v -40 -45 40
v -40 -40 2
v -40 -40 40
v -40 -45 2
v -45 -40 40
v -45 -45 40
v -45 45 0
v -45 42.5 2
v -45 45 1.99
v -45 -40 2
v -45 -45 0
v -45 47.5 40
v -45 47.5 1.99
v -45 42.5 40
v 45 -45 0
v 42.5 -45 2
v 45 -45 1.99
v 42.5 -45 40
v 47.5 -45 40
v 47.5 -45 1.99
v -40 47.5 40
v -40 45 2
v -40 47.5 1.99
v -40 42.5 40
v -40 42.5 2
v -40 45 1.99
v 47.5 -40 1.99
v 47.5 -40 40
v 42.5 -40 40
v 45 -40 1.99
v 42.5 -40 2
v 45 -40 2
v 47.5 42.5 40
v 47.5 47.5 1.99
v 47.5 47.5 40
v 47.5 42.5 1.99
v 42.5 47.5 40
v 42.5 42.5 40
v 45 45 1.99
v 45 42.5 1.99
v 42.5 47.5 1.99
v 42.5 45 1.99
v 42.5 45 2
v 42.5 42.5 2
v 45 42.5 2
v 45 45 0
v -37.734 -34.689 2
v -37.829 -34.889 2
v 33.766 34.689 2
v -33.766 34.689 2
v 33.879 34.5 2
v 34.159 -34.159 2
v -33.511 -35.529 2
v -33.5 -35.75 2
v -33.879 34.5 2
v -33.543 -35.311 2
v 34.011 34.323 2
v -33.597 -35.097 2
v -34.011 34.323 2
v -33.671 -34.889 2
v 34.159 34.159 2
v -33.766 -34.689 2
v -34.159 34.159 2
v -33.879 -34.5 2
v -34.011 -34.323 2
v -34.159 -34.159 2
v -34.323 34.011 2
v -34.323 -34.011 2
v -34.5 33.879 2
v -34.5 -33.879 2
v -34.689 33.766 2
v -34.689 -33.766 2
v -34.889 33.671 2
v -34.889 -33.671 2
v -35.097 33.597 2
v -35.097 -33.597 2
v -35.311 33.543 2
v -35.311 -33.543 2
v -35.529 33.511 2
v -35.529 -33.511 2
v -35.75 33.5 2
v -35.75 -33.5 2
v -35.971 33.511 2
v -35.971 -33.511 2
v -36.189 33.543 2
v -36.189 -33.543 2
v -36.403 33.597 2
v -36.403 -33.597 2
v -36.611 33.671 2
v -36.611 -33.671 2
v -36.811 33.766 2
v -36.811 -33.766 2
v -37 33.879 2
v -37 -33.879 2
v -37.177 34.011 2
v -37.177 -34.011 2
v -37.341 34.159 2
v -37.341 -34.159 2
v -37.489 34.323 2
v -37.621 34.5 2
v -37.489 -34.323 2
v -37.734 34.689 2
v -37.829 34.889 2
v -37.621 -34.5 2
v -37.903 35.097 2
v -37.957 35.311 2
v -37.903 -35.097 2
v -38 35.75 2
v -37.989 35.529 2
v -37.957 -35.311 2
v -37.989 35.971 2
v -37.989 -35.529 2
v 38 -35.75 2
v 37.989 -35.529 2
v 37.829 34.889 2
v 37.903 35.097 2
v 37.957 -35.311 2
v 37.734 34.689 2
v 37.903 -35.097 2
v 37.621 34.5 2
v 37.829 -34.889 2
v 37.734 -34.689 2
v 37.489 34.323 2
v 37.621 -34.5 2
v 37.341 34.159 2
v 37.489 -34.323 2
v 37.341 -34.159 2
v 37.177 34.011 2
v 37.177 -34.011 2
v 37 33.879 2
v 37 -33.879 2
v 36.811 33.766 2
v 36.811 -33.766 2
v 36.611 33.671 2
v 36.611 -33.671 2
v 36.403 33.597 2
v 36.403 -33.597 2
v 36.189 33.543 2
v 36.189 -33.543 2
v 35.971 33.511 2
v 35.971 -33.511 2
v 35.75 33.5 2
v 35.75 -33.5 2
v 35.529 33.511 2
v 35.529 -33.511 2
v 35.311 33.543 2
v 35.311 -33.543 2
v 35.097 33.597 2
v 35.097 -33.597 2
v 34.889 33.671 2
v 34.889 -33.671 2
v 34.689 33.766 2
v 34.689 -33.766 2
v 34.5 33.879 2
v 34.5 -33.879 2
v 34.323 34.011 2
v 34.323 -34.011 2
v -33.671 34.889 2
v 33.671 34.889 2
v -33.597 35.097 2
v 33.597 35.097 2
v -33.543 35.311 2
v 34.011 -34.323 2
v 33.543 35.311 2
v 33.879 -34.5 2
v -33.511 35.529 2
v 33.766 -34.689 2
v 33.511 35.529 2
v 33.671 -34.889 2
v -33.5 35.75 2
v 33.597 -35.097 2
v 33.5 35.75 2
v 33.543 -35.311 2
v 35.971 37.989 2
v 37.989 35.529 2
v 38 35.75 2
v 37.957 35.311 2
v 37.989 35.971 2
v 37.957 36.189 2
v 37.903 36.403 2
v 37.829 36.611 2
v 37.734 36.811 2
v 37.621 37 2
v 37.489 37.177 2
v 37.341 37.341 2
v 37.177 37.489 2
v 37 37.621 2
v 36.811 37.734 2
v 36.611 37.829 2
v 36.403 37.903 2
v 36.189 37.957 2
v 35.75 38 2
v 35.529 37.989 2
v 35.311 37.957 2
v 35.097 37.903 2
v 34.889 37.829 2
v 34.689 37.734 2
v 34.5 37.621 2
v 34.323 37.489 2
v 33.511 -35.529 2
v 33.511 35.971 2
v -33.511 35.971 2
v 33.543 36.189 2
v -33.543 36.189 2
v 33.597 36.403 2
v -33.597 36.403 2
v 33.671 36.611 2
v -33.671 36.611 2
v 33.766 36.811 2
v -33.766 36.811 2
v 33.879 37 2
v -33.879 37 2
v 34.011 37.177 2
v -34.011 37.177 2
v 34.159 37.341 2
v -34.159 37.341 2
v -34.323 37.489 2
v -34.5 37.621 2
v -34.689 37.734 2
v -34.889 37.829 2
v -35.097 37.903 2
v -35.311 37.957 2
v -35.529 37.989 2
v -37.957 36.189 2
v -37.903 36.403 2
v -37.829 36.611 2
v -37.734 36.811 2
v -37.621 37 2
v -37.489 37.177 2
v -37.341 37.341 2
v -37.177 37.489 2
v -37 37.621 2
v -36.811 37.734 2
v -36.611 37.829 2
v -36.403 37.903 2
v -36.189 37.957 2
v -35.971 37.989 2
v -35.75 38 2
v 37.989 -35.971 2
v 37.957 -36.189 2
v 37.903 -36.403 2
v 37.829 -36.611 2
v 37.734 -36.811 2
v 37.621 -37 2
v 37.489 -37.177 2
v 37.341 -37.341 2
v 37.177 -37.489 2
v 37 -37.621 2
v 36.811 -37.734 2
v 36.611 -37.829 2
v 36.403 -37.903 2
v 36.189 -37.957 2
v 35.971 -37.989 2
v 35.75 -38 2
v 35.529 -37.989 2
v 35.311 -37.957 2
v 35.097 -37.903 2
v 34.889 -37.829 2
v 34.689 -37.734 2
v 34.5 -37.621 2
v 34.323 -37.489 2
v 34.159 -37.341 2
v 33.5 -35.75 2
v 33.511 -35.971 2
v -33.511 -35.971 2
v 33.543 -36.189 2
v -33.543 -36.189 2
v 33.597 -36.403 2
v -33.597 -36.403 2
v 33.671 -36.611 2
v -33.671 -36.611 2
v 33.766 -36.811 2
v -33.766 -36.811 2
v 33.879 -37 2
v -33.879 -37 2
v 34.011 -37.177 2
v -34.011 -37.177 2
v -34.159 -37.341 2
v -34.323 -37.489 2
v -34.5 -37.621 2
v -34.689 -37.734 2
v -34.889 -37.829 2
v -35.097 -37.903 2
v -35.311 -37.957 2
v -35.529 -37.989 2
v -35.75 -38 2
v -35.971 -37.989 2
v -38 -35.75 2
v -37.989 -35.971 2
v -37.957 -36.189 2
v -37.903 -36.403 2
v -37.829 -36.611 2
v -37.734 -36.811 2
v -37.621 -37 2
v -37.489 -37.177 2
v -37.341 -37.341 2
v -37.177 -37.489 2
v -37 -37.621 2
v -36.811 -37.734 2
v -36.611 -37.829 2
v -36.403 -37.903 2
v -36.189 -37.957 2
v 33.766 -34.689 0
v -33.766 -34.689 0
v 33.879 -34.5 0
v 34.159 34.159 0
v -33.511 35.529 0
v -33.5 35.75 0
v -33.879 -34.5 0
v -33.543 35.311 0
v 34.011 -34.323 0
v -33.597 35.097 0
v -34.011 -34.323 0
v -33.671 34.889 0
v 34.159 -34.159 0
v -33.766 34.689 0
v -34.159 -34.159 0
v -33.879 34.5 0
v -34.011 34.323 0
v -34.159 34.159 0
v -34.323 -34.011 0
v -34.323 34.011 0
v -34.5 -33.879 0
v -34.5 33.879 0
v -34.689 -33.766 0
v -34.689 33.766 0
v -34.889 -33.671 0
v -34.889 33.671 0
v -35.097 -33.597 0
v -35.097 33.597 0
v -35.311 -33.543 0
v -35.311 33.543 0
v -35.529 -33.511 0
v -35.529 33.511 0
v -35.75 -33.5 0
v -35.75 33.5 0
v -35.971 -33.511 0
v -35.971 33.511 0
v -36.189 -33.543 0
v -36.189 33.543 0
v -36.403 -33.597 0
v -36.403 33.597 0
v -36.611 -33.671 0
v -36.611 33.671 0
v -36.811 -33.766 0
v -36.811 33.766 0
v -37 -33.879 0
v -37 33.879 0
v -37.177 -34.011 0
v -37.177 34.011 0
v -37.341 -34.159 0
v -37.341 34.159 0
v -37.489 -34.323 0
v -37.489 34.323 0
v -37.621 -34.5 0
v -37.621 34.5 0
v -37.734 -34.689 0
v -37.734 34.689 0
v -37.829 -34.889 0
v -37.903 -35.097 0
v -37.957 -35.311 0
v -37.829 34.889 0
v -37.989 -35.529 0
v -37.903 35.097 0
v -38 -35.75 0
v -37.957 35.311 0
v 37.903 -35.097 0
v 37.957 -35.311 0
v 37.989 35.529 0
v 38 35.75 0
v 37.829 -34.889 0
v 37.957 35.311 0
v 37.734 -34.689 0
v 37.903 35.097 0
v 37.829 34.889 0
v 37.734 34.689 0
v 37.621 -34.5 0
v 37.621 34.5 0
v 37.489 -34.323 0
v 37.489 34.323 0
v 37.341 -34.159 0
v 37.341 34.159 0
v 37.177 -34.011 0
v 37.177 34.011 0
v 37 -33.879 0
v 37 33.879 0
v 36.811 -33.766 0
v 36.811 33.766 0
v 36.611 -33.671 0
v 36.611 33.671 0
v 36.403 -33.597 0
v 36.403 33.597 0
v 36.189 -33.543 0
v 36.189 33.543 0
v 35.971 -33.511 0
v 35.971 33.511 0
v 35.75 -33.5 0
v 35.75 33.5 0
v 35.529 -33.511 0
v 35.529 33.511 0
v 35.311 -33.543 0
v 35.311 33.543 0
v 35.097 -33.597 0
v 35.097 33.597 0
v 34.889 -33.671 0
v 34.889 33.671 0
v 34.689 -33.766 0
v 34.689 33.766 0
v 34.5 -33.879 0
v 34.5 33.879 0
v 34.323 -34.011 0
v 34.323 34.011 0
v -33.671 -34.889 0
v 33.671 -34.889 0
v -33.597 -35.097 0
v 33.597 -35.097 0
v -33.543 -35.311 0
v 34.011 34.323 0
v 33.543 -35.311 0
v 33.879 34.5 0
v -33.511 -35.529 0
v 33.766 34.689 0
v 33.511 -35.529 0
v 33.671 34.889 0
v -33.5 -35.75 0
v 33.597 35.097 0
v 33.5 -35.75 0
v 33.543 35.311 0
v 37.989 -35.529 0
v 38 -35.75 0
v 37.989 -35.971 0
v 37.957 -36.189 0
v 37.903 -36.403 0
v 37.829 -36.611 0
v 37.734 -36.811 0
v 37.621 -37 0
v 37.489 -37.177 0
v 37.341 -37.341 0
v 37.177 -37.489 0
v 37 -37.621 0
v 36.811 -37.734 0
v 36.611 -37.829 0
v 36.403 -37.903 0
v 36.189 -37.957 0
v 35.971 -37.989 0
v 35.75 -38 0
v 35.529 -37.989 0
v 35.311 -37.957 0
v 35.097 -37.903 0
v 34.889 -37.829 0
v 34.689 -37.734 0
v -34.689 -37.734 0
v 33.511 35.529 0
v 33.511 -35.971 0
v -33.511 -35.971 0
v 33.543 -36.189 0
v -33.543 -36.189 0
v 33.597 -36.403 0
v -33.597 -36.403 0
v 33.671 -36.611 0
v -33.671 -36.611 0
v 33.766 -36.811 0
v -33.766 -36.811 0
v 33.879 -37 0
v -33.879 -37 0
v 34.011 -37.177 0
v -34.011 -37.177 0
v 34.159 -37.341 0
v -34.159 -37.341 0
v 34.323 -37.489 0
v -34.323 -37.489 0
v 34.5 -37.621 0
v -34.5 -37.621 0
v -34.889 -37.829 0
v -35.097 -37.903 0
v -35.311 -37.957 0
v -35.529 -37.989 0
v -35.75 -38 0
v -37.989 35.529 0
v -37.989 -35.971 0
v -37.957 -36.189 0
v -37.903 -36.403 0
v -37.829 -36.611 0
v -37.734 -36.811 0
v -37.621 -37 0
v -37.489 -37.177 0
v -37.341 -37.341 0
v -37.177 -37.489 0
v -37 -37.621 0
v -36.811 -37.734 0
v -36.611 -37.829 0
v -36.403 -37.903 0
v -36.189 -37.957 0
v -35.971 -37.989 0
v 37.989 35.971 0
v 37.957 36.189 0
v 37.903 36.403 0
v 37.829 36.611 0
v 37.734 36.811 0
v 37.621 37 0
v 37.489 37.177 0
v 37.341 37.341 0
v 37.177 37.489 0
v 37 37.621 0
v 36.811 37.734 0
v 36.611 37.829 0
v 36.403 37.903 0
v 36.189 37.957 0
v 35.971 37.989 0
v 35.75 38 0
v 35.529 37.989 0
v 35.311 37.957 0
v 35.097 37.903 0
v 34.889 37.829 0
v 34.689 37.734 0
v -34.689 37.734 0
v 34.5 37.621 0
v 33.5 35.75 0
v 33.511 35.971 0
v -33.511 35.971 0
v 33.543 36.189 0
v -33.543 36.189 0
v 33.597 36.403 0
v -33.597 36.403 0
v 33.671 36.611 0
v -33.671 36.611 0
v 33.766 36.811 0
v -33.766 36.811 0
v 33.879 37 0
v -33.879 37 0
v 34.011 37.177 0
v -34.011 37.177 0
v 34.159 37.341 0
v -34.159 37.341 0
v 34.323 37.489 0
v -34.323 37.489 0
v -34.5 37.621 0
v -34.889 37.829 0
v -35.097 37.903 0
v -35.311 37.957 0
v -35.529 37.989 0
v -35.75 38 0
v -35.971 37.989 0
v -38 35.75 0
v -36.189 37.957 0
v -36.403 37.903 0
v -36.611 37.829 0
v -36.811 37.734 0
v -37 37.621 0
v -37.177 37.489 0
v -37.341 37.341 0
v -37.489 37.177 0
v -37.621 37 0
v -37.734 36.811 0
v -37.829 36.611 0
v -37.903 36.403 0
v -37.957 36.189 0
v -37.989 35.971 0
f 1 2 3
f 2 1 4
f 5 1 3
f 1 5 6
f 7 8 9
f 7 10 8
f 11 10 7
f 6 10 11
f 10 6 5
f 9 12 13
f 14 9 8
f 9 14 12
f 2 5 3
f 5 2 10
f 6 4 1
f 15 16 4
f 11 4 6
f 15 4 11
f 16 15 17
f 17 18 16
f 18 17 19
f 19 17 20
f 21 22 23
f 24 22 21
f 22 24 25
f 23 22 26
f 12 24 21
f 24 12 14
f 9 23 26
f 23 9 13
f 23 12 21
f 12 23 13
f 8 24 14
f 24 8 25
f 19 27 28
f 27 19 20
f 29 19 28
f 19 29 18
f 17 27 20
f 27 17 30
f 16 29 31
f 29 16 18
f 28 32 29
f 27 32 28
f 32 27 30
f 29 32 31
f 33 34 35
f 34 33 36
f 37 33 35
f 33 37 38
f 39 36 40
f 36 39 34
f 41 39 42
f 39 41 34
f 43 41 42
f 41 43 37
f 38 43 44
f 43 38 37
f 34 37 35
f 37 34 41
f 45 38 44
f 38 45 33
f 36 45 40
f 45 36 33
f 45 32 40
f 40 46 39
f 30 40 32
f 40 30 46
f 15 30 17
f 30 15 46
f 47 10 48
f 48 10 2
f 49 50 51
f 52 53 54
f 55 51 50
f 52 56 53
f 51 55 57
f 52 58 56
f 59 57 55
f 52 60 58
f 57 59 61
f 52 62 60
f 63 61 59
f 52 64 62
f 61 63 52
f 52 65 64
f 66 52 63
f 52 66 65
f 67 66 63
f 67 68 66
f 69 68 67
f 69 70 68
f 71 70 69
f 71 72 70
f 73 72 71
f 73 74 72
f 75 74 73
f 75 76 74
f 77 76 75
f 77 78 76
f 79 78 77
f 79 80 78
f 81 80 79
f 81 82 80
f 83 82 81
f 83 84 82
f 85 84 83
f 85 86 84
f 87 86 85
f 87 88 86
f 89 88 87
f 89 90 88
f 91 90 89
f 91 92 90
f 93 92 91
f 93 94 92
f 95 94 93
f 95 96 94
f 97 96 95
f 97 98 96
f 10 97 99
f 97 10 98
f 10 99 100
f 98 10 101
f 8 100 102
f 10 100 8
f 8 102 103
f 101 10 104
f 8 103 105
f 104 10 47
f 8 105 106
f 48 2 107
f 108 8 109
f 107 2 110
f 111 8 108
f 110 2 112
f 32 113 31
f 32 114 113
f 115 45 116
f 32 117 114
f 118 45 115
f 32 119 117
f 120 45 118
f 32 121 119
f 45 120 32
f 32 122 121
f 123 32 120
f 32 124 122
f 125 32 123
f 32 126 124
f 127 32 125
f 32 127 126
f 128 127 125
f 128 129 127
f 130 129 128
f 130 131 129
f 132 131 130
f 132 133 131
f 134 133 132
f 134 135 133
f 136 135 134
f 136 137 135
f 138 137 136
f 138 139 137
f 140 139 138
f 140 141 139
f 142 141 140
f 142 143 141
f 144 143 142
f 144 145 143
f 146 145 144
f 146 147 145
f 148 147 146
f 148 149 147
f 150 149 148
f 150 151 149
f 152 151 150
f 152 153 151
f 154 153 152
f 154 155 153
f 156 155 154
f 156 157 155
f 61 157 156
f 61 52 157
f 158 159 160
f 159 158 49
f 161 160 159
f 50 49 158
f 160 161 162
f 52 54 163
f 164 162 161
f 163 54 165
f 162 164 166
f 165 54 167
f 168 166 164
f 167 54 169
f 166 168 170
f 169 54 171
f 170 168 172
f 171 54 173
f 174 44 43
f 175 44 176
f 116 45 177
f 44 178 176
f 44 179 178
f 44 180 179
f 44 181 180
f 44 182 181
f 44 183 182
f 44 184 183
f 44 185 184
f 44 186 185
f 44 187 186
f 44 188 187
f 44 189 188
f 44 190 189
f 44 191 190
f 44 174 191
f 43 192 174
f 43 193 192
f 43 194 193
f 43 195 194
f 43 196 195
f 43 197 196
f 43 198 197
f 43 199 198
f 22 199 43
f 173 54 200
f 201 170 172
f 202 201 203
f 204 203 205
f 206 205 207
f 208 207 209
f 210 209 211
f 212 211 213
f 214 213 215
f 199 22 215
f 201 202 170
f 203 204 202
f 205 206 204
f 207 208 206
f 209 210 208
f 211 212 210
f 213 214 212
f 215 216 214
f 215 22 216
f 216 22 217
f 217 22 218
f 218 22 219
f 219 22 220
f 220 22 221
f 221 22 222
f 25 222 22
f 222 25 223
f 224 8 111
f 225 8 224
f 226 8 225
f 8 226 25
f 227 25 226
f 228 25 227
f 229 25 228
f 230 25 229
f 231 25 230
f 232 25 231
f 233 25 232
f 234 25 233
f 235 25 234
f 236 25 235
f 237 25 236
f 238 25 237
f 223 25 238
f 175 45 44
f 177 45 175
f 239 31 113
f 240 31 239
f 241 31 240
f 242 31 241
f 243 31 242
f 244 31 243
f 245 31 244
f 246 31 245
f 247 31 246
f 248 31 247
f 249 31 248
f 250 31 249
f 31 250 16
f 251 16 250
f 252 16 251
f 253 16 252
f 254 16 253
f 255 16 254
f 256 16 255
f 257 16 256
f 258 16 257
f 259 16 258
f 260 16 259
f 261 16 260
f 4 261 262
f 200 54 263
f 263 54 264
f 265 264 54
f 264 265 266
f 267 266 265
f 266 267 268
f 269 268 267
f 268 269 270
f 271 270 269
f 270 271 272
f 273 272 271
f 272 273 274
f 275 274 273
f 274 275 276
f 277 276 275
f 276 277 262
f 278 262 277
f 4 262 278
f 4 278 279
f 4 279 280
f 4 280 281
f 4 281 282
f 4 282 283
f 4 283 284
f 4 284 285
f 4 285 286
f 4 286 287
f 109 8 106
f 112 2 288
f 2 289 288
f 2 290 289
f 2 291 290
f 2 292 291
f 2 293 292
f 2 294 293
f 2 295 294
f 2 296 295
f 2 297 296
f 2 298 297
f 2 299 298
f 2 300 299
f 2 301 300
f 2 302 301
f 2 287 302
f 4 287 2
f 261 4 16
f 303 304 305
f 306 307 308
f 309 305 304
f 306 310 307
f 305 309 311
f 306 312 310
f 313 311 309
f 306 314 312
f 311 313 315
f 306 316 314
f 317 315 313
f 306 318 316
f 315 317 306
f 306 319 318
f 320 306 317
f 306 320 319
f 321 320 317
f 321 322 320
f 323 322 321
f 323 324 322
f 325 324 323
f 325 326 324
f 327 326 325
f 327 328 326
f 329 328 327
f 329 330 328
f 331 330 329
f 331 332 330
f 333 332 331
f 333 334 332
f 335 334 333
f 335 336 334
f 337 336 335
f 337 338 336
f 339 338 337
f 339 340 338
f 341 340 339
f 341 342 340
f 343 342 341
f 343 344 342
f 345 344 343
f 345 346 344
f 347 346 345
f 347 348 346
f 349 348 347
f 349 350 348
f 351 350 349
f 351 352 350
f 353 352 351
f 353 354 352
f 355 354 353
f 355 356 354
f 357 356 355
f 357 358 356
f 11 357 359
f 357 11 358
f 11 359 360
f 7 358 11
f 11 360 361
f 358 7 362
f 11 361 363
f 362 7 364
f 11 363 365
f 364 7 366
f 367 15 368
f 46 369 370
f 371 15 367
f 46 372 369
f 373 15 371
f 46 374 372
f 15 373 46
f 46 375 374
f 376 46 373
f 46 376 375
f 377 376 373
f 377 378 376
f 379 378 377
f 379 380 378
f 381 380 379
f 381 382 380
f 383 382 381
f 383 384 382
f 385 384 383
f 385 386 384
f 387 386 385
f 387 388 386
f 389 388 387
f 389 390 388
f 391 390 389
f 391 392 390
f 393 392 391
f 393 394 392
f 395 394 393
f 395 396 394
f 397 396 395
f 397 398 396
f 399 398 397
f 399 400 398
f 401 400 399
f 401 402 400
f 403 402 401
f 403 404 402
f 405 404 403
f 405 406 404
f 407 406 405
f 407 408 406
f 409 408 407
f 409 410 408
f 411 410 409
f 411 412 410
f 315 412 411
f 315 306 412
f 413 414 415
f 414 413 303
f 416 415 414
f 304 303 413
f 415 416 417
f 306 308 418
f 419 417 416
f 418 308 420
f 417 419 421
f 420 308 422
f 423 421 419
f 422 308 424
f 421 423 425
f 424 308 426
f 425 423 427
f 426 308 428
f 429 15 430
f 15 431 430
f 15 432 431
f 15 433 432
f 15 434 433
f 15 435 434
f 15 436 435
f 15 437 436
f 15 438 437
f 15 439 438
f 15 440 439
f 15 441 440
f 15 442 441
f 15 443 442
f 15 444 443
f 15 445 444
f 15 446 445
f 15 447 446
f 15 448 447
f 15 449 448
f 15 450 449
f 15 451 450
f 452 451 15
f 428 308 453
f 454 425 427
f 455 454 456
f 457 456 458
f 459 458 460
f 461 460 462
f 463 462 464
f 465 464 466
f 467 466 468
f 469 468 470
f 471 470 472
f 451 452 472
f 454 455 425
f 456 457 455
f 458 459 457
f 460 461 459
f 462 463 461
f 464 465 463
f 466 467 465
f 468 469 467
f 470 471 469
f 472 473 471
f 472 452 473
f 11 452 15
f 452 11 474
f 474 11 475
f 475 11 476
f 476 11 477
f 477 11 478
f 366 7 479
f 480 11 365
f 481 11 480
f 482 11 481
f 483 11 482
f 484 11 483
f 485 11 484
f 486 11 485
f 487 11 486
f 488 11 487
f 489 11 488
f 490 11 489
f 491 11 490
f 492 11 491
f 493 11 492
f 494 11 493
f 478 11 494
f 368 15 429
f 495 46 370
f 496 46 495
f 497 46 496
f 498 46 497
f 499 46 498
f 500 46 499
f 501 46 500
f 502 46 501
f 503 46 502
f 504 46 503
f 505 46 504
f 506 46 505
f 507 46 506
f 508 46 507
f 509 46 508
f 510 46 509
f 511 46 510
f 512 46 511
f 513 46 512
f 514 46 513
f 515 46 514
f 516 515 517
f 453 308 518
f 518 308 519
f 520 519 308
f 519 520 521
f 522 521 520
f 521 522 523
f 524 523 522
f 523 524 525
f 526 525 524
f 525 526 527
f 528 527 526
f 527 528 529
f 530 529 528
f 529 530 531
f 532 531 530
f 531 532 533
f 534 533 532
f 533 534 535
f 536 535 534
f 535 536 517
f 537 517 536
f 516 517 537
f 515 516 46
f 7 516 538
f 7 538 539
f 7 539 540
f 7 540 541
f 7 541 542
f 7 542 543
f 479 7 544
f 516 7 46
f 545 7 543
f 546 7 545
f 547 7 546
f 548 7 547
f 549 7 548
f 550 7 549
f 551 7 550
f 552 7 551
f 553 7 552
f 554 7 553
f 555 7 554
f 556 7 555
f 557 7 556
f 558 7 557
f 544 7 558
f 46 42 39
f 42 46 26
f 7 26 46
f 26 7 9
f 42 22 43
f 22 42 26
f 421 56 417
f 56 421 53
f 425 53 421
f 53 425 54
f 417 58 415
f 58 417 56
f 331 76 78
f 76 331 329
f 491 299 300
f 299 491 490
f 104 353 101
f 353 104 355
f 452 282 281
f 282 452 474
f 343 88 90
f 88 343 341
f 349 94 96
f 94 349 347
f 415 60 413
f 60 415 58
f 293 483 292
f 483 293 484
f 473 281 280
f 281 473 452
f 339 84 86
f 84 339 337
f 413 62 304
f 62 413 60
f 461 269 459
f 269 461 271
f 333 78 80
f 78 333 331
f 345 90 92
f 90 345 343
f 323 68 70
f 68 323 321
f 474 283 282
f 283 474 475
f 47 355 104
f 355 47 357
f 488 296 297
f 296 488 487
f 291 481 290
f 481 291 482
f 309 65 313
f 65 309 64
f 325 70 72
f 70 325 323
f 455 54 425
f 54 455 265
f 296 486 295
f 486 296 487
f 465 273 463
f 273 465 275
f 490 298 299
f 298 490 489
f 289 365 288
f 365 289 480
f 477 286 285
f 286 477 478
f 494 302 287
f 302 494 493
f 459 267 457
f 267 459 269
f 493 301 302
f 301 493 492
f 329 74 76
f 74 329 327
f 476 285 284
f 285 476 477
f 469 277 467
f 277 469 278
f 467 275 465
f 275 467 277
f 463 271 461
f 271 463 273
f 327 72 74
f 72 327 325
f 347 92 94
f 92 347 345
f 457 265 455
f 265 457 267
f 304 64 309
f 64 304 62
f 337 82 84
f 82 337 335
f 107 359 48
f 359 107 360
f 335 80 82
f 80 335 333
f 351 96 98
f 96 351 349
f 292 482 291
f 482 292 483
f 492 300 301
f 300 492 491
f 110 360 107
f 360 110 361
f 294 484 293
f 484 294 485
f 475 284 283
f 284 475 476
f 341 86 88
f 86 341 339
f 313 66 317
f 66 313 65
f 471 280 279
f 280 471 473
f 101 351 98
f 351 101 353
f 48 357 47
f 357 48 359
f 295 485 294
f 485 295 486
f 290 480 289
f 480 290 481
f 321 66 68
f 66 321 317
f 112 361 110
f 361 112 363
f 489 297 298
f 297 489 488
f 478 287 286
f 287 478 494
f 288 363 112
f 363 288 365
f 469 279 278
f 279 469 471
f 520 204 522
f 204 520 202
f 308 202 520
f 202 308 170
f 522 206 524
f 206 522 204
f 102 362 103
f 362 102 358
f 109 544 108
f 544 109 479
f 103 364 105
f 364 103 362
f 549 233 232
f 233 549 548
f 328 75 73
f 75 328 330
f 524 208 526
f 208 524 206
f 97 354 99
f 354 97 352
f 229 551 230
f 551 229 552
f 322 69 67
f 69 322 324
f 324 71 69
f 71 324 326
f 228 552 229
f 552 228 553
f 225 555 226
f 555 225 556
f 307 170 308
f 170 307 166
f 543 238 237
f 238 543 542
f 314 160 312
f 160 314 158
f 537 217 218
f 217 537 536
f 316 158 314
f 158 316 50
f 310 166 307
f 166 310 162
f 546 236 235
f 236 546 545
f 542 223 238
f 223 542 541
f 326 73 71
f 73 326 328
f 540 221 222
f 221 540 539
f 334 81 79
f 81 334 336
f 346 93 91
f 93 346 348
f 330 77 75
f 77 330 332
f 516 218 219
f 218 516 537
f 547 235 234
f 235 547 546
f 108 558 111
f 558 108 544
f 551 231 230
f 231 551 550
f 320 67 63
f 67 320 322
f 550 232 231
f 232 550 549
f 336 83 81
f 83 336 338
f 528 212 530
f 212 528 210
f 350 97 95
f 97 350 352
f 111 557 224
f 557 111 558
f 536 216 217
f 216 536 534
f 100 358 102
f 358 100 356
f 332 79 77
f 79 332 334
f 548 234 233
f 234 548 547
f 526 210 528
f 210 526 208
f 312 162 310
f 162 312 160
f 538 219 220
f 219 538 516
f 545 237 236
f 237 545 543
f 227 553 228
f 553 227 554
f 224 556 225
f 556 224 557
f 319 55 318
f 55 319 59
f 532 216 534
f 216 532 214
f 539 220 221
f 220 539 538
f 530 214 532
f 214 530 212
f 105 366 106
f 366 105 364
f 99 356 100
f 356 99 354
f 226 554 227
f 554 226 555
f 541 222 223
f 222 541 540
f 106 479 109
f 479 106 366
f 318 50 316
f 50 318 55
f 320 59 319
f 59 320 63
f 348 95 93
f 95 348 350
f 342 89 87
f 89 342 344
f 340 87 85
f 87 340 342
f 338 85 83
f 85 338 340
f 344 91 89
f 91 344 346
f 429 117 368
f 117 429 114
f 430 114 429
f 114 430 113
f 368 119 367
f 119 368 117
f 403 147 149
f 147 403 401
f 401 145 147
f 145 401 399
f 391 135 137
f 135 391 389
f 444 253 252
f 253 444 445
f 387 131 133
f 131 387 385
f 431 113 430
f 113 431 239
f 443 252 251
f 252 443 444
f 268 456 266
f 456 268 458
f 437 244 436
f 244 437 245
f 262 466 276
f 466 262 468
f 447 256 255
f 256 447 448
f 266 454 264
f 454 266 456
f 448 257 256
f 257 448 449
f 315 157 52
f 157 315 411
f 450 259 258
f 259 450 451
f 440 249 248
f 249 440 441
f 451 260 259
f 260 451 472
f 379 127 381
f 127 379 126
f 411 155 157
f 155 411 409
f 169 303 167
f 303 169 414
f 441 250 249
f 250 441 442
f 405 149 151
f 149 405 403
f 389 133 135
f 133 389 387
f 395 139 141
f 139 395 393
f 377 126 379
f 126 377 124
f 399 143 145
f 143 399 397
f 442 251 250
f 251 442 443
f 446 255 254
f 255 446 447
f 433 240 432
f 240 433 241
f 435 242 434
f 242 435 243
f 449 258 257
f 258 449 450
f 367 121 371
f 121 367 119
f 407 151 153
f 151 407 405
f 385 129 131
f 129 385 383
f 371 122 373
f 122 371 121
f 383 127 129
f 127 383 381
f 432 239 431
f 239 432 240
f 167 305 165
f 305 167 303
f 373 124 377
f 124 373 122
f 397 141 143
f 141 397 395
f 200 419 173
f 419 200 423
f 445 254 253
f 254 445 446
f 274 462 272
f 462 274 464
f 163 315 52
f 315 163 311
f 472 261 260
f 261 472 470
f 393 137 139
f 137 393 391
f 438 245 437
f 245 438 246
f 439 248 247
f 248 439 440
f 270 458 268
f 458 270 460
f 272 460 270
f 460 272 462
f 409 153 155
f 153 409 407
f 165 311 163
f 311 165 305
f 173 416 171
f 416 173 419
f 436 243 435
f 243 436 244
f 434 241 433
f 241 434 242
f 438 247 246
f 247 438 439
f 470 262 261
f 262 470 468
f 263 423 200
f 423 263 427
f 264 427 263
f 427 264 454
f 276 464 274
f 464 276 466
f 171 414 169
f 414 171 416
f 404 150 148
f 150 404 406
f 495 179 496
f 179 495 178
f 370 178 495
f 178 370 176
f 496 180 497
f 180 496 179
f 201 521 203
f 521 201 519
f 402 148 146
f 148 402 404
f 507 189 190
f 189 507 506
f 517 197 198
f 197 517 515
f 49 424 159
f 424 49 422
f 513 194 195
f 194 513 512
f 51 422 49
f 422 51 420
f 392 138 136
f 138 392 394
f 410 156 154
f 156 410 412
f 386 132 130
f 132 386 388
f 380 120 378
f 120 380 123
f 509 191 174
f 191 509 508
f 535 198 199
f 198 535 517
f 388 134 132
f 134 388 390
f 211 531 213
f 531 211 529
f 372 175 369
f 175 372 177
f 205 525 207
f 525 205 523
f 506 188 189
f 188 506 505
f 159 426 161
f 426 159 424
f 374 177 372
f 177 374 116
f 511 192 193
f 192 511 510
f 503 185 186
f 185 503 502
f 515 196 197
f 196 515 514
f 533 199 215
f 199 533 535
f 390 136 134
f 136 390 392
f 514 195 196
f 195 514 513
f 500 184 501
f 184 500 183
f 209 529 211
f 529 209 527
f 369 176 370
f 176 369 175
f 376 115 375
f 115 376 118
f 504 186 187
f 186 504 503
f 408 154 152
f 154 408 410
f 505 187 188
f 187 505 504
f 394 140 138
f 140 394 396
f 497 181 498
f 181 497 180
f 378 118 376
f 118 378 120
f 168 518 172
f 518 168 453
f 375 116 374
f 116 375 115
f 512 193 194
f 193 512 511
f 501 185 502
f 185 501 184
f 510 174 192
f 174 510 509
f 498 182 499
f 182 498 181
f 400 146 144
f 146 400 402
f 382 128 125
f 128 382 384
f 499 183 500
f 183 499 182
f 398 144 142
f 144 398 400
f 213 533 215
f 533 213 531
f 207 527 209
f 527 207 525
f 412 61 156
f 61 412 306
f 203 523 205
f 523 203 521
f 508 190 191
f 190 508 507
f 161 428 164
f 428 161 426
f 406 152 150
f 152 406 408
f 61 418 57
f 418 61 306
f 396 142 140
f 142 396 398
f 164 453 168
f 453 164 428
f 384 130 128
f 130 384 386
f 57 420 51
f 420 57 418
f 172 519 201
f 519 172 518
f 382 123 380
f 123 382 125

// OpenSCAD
// DIY magnetic stirrer housing (print orientation: top plate down, box open upward)
// Units: mm. Fan: 80 mm PC case fan.

$fn = 64;

// ---- Dimensions ----
plate_t      = 2;     // top plate thickness (z = 0 to 2)
wall_t       = 2.5;   // wall thickness (z = 2 to 40)
box_h        = 40;    // outer height of box top (z = 40)
outer_x      = 90;    // outer size in X
outer_y      = 90;    // outer size in Y
hole_d       = 4.5;   // M4 screw hole diameter
hole_pitch   = 71.5;  // square pattern side for screw holes
notch_w      = 12;    // cable notch width
notch_depth  = 8;     // notch depth from open edge (z = 32 to 40)
eps          = 0.5;   // cutter overshoot past faces

// ---- Model ----
difference() {
    union() {
        // Top plate (lies on bed)
        translate([-outer_x/2, -outer_y/2, 0])
            cube([outer_x, outer_y, plate_t]);

        // Four walls rising from plate to z = box_h
        for (sx = [-1, 1], sy = [-1, 1])
            translate([sx > 0 ? outer_x/2 - wall_t : -outer_x/2,
                       sy > 0 ? outer_y/2 - wall_t : -outer_y/2,
                       plate_t - 0.01])
                cube([2*wall_t, 2*wall_t, box_h - plate_t + 0.01]);
    }

    // Screw holes through top plate on 71.5 mm square pattern
    for (x = [-hole_pitch/2, hole_pitch/2])
        for (y = [-hole_pitch/2, hole_pitch/2])
            translate([x, y, -eps])
                cylinder(d = hole_d, h = plate_t + 2*eps);

    // Cable notch in one wall, centred along the wall
    translate([outer_x/2 - wall_t - 6, 0, box_h - notch_depth])
        cube([notch_w, 2*wall_t + eps, notch_depth + eps]);
}
